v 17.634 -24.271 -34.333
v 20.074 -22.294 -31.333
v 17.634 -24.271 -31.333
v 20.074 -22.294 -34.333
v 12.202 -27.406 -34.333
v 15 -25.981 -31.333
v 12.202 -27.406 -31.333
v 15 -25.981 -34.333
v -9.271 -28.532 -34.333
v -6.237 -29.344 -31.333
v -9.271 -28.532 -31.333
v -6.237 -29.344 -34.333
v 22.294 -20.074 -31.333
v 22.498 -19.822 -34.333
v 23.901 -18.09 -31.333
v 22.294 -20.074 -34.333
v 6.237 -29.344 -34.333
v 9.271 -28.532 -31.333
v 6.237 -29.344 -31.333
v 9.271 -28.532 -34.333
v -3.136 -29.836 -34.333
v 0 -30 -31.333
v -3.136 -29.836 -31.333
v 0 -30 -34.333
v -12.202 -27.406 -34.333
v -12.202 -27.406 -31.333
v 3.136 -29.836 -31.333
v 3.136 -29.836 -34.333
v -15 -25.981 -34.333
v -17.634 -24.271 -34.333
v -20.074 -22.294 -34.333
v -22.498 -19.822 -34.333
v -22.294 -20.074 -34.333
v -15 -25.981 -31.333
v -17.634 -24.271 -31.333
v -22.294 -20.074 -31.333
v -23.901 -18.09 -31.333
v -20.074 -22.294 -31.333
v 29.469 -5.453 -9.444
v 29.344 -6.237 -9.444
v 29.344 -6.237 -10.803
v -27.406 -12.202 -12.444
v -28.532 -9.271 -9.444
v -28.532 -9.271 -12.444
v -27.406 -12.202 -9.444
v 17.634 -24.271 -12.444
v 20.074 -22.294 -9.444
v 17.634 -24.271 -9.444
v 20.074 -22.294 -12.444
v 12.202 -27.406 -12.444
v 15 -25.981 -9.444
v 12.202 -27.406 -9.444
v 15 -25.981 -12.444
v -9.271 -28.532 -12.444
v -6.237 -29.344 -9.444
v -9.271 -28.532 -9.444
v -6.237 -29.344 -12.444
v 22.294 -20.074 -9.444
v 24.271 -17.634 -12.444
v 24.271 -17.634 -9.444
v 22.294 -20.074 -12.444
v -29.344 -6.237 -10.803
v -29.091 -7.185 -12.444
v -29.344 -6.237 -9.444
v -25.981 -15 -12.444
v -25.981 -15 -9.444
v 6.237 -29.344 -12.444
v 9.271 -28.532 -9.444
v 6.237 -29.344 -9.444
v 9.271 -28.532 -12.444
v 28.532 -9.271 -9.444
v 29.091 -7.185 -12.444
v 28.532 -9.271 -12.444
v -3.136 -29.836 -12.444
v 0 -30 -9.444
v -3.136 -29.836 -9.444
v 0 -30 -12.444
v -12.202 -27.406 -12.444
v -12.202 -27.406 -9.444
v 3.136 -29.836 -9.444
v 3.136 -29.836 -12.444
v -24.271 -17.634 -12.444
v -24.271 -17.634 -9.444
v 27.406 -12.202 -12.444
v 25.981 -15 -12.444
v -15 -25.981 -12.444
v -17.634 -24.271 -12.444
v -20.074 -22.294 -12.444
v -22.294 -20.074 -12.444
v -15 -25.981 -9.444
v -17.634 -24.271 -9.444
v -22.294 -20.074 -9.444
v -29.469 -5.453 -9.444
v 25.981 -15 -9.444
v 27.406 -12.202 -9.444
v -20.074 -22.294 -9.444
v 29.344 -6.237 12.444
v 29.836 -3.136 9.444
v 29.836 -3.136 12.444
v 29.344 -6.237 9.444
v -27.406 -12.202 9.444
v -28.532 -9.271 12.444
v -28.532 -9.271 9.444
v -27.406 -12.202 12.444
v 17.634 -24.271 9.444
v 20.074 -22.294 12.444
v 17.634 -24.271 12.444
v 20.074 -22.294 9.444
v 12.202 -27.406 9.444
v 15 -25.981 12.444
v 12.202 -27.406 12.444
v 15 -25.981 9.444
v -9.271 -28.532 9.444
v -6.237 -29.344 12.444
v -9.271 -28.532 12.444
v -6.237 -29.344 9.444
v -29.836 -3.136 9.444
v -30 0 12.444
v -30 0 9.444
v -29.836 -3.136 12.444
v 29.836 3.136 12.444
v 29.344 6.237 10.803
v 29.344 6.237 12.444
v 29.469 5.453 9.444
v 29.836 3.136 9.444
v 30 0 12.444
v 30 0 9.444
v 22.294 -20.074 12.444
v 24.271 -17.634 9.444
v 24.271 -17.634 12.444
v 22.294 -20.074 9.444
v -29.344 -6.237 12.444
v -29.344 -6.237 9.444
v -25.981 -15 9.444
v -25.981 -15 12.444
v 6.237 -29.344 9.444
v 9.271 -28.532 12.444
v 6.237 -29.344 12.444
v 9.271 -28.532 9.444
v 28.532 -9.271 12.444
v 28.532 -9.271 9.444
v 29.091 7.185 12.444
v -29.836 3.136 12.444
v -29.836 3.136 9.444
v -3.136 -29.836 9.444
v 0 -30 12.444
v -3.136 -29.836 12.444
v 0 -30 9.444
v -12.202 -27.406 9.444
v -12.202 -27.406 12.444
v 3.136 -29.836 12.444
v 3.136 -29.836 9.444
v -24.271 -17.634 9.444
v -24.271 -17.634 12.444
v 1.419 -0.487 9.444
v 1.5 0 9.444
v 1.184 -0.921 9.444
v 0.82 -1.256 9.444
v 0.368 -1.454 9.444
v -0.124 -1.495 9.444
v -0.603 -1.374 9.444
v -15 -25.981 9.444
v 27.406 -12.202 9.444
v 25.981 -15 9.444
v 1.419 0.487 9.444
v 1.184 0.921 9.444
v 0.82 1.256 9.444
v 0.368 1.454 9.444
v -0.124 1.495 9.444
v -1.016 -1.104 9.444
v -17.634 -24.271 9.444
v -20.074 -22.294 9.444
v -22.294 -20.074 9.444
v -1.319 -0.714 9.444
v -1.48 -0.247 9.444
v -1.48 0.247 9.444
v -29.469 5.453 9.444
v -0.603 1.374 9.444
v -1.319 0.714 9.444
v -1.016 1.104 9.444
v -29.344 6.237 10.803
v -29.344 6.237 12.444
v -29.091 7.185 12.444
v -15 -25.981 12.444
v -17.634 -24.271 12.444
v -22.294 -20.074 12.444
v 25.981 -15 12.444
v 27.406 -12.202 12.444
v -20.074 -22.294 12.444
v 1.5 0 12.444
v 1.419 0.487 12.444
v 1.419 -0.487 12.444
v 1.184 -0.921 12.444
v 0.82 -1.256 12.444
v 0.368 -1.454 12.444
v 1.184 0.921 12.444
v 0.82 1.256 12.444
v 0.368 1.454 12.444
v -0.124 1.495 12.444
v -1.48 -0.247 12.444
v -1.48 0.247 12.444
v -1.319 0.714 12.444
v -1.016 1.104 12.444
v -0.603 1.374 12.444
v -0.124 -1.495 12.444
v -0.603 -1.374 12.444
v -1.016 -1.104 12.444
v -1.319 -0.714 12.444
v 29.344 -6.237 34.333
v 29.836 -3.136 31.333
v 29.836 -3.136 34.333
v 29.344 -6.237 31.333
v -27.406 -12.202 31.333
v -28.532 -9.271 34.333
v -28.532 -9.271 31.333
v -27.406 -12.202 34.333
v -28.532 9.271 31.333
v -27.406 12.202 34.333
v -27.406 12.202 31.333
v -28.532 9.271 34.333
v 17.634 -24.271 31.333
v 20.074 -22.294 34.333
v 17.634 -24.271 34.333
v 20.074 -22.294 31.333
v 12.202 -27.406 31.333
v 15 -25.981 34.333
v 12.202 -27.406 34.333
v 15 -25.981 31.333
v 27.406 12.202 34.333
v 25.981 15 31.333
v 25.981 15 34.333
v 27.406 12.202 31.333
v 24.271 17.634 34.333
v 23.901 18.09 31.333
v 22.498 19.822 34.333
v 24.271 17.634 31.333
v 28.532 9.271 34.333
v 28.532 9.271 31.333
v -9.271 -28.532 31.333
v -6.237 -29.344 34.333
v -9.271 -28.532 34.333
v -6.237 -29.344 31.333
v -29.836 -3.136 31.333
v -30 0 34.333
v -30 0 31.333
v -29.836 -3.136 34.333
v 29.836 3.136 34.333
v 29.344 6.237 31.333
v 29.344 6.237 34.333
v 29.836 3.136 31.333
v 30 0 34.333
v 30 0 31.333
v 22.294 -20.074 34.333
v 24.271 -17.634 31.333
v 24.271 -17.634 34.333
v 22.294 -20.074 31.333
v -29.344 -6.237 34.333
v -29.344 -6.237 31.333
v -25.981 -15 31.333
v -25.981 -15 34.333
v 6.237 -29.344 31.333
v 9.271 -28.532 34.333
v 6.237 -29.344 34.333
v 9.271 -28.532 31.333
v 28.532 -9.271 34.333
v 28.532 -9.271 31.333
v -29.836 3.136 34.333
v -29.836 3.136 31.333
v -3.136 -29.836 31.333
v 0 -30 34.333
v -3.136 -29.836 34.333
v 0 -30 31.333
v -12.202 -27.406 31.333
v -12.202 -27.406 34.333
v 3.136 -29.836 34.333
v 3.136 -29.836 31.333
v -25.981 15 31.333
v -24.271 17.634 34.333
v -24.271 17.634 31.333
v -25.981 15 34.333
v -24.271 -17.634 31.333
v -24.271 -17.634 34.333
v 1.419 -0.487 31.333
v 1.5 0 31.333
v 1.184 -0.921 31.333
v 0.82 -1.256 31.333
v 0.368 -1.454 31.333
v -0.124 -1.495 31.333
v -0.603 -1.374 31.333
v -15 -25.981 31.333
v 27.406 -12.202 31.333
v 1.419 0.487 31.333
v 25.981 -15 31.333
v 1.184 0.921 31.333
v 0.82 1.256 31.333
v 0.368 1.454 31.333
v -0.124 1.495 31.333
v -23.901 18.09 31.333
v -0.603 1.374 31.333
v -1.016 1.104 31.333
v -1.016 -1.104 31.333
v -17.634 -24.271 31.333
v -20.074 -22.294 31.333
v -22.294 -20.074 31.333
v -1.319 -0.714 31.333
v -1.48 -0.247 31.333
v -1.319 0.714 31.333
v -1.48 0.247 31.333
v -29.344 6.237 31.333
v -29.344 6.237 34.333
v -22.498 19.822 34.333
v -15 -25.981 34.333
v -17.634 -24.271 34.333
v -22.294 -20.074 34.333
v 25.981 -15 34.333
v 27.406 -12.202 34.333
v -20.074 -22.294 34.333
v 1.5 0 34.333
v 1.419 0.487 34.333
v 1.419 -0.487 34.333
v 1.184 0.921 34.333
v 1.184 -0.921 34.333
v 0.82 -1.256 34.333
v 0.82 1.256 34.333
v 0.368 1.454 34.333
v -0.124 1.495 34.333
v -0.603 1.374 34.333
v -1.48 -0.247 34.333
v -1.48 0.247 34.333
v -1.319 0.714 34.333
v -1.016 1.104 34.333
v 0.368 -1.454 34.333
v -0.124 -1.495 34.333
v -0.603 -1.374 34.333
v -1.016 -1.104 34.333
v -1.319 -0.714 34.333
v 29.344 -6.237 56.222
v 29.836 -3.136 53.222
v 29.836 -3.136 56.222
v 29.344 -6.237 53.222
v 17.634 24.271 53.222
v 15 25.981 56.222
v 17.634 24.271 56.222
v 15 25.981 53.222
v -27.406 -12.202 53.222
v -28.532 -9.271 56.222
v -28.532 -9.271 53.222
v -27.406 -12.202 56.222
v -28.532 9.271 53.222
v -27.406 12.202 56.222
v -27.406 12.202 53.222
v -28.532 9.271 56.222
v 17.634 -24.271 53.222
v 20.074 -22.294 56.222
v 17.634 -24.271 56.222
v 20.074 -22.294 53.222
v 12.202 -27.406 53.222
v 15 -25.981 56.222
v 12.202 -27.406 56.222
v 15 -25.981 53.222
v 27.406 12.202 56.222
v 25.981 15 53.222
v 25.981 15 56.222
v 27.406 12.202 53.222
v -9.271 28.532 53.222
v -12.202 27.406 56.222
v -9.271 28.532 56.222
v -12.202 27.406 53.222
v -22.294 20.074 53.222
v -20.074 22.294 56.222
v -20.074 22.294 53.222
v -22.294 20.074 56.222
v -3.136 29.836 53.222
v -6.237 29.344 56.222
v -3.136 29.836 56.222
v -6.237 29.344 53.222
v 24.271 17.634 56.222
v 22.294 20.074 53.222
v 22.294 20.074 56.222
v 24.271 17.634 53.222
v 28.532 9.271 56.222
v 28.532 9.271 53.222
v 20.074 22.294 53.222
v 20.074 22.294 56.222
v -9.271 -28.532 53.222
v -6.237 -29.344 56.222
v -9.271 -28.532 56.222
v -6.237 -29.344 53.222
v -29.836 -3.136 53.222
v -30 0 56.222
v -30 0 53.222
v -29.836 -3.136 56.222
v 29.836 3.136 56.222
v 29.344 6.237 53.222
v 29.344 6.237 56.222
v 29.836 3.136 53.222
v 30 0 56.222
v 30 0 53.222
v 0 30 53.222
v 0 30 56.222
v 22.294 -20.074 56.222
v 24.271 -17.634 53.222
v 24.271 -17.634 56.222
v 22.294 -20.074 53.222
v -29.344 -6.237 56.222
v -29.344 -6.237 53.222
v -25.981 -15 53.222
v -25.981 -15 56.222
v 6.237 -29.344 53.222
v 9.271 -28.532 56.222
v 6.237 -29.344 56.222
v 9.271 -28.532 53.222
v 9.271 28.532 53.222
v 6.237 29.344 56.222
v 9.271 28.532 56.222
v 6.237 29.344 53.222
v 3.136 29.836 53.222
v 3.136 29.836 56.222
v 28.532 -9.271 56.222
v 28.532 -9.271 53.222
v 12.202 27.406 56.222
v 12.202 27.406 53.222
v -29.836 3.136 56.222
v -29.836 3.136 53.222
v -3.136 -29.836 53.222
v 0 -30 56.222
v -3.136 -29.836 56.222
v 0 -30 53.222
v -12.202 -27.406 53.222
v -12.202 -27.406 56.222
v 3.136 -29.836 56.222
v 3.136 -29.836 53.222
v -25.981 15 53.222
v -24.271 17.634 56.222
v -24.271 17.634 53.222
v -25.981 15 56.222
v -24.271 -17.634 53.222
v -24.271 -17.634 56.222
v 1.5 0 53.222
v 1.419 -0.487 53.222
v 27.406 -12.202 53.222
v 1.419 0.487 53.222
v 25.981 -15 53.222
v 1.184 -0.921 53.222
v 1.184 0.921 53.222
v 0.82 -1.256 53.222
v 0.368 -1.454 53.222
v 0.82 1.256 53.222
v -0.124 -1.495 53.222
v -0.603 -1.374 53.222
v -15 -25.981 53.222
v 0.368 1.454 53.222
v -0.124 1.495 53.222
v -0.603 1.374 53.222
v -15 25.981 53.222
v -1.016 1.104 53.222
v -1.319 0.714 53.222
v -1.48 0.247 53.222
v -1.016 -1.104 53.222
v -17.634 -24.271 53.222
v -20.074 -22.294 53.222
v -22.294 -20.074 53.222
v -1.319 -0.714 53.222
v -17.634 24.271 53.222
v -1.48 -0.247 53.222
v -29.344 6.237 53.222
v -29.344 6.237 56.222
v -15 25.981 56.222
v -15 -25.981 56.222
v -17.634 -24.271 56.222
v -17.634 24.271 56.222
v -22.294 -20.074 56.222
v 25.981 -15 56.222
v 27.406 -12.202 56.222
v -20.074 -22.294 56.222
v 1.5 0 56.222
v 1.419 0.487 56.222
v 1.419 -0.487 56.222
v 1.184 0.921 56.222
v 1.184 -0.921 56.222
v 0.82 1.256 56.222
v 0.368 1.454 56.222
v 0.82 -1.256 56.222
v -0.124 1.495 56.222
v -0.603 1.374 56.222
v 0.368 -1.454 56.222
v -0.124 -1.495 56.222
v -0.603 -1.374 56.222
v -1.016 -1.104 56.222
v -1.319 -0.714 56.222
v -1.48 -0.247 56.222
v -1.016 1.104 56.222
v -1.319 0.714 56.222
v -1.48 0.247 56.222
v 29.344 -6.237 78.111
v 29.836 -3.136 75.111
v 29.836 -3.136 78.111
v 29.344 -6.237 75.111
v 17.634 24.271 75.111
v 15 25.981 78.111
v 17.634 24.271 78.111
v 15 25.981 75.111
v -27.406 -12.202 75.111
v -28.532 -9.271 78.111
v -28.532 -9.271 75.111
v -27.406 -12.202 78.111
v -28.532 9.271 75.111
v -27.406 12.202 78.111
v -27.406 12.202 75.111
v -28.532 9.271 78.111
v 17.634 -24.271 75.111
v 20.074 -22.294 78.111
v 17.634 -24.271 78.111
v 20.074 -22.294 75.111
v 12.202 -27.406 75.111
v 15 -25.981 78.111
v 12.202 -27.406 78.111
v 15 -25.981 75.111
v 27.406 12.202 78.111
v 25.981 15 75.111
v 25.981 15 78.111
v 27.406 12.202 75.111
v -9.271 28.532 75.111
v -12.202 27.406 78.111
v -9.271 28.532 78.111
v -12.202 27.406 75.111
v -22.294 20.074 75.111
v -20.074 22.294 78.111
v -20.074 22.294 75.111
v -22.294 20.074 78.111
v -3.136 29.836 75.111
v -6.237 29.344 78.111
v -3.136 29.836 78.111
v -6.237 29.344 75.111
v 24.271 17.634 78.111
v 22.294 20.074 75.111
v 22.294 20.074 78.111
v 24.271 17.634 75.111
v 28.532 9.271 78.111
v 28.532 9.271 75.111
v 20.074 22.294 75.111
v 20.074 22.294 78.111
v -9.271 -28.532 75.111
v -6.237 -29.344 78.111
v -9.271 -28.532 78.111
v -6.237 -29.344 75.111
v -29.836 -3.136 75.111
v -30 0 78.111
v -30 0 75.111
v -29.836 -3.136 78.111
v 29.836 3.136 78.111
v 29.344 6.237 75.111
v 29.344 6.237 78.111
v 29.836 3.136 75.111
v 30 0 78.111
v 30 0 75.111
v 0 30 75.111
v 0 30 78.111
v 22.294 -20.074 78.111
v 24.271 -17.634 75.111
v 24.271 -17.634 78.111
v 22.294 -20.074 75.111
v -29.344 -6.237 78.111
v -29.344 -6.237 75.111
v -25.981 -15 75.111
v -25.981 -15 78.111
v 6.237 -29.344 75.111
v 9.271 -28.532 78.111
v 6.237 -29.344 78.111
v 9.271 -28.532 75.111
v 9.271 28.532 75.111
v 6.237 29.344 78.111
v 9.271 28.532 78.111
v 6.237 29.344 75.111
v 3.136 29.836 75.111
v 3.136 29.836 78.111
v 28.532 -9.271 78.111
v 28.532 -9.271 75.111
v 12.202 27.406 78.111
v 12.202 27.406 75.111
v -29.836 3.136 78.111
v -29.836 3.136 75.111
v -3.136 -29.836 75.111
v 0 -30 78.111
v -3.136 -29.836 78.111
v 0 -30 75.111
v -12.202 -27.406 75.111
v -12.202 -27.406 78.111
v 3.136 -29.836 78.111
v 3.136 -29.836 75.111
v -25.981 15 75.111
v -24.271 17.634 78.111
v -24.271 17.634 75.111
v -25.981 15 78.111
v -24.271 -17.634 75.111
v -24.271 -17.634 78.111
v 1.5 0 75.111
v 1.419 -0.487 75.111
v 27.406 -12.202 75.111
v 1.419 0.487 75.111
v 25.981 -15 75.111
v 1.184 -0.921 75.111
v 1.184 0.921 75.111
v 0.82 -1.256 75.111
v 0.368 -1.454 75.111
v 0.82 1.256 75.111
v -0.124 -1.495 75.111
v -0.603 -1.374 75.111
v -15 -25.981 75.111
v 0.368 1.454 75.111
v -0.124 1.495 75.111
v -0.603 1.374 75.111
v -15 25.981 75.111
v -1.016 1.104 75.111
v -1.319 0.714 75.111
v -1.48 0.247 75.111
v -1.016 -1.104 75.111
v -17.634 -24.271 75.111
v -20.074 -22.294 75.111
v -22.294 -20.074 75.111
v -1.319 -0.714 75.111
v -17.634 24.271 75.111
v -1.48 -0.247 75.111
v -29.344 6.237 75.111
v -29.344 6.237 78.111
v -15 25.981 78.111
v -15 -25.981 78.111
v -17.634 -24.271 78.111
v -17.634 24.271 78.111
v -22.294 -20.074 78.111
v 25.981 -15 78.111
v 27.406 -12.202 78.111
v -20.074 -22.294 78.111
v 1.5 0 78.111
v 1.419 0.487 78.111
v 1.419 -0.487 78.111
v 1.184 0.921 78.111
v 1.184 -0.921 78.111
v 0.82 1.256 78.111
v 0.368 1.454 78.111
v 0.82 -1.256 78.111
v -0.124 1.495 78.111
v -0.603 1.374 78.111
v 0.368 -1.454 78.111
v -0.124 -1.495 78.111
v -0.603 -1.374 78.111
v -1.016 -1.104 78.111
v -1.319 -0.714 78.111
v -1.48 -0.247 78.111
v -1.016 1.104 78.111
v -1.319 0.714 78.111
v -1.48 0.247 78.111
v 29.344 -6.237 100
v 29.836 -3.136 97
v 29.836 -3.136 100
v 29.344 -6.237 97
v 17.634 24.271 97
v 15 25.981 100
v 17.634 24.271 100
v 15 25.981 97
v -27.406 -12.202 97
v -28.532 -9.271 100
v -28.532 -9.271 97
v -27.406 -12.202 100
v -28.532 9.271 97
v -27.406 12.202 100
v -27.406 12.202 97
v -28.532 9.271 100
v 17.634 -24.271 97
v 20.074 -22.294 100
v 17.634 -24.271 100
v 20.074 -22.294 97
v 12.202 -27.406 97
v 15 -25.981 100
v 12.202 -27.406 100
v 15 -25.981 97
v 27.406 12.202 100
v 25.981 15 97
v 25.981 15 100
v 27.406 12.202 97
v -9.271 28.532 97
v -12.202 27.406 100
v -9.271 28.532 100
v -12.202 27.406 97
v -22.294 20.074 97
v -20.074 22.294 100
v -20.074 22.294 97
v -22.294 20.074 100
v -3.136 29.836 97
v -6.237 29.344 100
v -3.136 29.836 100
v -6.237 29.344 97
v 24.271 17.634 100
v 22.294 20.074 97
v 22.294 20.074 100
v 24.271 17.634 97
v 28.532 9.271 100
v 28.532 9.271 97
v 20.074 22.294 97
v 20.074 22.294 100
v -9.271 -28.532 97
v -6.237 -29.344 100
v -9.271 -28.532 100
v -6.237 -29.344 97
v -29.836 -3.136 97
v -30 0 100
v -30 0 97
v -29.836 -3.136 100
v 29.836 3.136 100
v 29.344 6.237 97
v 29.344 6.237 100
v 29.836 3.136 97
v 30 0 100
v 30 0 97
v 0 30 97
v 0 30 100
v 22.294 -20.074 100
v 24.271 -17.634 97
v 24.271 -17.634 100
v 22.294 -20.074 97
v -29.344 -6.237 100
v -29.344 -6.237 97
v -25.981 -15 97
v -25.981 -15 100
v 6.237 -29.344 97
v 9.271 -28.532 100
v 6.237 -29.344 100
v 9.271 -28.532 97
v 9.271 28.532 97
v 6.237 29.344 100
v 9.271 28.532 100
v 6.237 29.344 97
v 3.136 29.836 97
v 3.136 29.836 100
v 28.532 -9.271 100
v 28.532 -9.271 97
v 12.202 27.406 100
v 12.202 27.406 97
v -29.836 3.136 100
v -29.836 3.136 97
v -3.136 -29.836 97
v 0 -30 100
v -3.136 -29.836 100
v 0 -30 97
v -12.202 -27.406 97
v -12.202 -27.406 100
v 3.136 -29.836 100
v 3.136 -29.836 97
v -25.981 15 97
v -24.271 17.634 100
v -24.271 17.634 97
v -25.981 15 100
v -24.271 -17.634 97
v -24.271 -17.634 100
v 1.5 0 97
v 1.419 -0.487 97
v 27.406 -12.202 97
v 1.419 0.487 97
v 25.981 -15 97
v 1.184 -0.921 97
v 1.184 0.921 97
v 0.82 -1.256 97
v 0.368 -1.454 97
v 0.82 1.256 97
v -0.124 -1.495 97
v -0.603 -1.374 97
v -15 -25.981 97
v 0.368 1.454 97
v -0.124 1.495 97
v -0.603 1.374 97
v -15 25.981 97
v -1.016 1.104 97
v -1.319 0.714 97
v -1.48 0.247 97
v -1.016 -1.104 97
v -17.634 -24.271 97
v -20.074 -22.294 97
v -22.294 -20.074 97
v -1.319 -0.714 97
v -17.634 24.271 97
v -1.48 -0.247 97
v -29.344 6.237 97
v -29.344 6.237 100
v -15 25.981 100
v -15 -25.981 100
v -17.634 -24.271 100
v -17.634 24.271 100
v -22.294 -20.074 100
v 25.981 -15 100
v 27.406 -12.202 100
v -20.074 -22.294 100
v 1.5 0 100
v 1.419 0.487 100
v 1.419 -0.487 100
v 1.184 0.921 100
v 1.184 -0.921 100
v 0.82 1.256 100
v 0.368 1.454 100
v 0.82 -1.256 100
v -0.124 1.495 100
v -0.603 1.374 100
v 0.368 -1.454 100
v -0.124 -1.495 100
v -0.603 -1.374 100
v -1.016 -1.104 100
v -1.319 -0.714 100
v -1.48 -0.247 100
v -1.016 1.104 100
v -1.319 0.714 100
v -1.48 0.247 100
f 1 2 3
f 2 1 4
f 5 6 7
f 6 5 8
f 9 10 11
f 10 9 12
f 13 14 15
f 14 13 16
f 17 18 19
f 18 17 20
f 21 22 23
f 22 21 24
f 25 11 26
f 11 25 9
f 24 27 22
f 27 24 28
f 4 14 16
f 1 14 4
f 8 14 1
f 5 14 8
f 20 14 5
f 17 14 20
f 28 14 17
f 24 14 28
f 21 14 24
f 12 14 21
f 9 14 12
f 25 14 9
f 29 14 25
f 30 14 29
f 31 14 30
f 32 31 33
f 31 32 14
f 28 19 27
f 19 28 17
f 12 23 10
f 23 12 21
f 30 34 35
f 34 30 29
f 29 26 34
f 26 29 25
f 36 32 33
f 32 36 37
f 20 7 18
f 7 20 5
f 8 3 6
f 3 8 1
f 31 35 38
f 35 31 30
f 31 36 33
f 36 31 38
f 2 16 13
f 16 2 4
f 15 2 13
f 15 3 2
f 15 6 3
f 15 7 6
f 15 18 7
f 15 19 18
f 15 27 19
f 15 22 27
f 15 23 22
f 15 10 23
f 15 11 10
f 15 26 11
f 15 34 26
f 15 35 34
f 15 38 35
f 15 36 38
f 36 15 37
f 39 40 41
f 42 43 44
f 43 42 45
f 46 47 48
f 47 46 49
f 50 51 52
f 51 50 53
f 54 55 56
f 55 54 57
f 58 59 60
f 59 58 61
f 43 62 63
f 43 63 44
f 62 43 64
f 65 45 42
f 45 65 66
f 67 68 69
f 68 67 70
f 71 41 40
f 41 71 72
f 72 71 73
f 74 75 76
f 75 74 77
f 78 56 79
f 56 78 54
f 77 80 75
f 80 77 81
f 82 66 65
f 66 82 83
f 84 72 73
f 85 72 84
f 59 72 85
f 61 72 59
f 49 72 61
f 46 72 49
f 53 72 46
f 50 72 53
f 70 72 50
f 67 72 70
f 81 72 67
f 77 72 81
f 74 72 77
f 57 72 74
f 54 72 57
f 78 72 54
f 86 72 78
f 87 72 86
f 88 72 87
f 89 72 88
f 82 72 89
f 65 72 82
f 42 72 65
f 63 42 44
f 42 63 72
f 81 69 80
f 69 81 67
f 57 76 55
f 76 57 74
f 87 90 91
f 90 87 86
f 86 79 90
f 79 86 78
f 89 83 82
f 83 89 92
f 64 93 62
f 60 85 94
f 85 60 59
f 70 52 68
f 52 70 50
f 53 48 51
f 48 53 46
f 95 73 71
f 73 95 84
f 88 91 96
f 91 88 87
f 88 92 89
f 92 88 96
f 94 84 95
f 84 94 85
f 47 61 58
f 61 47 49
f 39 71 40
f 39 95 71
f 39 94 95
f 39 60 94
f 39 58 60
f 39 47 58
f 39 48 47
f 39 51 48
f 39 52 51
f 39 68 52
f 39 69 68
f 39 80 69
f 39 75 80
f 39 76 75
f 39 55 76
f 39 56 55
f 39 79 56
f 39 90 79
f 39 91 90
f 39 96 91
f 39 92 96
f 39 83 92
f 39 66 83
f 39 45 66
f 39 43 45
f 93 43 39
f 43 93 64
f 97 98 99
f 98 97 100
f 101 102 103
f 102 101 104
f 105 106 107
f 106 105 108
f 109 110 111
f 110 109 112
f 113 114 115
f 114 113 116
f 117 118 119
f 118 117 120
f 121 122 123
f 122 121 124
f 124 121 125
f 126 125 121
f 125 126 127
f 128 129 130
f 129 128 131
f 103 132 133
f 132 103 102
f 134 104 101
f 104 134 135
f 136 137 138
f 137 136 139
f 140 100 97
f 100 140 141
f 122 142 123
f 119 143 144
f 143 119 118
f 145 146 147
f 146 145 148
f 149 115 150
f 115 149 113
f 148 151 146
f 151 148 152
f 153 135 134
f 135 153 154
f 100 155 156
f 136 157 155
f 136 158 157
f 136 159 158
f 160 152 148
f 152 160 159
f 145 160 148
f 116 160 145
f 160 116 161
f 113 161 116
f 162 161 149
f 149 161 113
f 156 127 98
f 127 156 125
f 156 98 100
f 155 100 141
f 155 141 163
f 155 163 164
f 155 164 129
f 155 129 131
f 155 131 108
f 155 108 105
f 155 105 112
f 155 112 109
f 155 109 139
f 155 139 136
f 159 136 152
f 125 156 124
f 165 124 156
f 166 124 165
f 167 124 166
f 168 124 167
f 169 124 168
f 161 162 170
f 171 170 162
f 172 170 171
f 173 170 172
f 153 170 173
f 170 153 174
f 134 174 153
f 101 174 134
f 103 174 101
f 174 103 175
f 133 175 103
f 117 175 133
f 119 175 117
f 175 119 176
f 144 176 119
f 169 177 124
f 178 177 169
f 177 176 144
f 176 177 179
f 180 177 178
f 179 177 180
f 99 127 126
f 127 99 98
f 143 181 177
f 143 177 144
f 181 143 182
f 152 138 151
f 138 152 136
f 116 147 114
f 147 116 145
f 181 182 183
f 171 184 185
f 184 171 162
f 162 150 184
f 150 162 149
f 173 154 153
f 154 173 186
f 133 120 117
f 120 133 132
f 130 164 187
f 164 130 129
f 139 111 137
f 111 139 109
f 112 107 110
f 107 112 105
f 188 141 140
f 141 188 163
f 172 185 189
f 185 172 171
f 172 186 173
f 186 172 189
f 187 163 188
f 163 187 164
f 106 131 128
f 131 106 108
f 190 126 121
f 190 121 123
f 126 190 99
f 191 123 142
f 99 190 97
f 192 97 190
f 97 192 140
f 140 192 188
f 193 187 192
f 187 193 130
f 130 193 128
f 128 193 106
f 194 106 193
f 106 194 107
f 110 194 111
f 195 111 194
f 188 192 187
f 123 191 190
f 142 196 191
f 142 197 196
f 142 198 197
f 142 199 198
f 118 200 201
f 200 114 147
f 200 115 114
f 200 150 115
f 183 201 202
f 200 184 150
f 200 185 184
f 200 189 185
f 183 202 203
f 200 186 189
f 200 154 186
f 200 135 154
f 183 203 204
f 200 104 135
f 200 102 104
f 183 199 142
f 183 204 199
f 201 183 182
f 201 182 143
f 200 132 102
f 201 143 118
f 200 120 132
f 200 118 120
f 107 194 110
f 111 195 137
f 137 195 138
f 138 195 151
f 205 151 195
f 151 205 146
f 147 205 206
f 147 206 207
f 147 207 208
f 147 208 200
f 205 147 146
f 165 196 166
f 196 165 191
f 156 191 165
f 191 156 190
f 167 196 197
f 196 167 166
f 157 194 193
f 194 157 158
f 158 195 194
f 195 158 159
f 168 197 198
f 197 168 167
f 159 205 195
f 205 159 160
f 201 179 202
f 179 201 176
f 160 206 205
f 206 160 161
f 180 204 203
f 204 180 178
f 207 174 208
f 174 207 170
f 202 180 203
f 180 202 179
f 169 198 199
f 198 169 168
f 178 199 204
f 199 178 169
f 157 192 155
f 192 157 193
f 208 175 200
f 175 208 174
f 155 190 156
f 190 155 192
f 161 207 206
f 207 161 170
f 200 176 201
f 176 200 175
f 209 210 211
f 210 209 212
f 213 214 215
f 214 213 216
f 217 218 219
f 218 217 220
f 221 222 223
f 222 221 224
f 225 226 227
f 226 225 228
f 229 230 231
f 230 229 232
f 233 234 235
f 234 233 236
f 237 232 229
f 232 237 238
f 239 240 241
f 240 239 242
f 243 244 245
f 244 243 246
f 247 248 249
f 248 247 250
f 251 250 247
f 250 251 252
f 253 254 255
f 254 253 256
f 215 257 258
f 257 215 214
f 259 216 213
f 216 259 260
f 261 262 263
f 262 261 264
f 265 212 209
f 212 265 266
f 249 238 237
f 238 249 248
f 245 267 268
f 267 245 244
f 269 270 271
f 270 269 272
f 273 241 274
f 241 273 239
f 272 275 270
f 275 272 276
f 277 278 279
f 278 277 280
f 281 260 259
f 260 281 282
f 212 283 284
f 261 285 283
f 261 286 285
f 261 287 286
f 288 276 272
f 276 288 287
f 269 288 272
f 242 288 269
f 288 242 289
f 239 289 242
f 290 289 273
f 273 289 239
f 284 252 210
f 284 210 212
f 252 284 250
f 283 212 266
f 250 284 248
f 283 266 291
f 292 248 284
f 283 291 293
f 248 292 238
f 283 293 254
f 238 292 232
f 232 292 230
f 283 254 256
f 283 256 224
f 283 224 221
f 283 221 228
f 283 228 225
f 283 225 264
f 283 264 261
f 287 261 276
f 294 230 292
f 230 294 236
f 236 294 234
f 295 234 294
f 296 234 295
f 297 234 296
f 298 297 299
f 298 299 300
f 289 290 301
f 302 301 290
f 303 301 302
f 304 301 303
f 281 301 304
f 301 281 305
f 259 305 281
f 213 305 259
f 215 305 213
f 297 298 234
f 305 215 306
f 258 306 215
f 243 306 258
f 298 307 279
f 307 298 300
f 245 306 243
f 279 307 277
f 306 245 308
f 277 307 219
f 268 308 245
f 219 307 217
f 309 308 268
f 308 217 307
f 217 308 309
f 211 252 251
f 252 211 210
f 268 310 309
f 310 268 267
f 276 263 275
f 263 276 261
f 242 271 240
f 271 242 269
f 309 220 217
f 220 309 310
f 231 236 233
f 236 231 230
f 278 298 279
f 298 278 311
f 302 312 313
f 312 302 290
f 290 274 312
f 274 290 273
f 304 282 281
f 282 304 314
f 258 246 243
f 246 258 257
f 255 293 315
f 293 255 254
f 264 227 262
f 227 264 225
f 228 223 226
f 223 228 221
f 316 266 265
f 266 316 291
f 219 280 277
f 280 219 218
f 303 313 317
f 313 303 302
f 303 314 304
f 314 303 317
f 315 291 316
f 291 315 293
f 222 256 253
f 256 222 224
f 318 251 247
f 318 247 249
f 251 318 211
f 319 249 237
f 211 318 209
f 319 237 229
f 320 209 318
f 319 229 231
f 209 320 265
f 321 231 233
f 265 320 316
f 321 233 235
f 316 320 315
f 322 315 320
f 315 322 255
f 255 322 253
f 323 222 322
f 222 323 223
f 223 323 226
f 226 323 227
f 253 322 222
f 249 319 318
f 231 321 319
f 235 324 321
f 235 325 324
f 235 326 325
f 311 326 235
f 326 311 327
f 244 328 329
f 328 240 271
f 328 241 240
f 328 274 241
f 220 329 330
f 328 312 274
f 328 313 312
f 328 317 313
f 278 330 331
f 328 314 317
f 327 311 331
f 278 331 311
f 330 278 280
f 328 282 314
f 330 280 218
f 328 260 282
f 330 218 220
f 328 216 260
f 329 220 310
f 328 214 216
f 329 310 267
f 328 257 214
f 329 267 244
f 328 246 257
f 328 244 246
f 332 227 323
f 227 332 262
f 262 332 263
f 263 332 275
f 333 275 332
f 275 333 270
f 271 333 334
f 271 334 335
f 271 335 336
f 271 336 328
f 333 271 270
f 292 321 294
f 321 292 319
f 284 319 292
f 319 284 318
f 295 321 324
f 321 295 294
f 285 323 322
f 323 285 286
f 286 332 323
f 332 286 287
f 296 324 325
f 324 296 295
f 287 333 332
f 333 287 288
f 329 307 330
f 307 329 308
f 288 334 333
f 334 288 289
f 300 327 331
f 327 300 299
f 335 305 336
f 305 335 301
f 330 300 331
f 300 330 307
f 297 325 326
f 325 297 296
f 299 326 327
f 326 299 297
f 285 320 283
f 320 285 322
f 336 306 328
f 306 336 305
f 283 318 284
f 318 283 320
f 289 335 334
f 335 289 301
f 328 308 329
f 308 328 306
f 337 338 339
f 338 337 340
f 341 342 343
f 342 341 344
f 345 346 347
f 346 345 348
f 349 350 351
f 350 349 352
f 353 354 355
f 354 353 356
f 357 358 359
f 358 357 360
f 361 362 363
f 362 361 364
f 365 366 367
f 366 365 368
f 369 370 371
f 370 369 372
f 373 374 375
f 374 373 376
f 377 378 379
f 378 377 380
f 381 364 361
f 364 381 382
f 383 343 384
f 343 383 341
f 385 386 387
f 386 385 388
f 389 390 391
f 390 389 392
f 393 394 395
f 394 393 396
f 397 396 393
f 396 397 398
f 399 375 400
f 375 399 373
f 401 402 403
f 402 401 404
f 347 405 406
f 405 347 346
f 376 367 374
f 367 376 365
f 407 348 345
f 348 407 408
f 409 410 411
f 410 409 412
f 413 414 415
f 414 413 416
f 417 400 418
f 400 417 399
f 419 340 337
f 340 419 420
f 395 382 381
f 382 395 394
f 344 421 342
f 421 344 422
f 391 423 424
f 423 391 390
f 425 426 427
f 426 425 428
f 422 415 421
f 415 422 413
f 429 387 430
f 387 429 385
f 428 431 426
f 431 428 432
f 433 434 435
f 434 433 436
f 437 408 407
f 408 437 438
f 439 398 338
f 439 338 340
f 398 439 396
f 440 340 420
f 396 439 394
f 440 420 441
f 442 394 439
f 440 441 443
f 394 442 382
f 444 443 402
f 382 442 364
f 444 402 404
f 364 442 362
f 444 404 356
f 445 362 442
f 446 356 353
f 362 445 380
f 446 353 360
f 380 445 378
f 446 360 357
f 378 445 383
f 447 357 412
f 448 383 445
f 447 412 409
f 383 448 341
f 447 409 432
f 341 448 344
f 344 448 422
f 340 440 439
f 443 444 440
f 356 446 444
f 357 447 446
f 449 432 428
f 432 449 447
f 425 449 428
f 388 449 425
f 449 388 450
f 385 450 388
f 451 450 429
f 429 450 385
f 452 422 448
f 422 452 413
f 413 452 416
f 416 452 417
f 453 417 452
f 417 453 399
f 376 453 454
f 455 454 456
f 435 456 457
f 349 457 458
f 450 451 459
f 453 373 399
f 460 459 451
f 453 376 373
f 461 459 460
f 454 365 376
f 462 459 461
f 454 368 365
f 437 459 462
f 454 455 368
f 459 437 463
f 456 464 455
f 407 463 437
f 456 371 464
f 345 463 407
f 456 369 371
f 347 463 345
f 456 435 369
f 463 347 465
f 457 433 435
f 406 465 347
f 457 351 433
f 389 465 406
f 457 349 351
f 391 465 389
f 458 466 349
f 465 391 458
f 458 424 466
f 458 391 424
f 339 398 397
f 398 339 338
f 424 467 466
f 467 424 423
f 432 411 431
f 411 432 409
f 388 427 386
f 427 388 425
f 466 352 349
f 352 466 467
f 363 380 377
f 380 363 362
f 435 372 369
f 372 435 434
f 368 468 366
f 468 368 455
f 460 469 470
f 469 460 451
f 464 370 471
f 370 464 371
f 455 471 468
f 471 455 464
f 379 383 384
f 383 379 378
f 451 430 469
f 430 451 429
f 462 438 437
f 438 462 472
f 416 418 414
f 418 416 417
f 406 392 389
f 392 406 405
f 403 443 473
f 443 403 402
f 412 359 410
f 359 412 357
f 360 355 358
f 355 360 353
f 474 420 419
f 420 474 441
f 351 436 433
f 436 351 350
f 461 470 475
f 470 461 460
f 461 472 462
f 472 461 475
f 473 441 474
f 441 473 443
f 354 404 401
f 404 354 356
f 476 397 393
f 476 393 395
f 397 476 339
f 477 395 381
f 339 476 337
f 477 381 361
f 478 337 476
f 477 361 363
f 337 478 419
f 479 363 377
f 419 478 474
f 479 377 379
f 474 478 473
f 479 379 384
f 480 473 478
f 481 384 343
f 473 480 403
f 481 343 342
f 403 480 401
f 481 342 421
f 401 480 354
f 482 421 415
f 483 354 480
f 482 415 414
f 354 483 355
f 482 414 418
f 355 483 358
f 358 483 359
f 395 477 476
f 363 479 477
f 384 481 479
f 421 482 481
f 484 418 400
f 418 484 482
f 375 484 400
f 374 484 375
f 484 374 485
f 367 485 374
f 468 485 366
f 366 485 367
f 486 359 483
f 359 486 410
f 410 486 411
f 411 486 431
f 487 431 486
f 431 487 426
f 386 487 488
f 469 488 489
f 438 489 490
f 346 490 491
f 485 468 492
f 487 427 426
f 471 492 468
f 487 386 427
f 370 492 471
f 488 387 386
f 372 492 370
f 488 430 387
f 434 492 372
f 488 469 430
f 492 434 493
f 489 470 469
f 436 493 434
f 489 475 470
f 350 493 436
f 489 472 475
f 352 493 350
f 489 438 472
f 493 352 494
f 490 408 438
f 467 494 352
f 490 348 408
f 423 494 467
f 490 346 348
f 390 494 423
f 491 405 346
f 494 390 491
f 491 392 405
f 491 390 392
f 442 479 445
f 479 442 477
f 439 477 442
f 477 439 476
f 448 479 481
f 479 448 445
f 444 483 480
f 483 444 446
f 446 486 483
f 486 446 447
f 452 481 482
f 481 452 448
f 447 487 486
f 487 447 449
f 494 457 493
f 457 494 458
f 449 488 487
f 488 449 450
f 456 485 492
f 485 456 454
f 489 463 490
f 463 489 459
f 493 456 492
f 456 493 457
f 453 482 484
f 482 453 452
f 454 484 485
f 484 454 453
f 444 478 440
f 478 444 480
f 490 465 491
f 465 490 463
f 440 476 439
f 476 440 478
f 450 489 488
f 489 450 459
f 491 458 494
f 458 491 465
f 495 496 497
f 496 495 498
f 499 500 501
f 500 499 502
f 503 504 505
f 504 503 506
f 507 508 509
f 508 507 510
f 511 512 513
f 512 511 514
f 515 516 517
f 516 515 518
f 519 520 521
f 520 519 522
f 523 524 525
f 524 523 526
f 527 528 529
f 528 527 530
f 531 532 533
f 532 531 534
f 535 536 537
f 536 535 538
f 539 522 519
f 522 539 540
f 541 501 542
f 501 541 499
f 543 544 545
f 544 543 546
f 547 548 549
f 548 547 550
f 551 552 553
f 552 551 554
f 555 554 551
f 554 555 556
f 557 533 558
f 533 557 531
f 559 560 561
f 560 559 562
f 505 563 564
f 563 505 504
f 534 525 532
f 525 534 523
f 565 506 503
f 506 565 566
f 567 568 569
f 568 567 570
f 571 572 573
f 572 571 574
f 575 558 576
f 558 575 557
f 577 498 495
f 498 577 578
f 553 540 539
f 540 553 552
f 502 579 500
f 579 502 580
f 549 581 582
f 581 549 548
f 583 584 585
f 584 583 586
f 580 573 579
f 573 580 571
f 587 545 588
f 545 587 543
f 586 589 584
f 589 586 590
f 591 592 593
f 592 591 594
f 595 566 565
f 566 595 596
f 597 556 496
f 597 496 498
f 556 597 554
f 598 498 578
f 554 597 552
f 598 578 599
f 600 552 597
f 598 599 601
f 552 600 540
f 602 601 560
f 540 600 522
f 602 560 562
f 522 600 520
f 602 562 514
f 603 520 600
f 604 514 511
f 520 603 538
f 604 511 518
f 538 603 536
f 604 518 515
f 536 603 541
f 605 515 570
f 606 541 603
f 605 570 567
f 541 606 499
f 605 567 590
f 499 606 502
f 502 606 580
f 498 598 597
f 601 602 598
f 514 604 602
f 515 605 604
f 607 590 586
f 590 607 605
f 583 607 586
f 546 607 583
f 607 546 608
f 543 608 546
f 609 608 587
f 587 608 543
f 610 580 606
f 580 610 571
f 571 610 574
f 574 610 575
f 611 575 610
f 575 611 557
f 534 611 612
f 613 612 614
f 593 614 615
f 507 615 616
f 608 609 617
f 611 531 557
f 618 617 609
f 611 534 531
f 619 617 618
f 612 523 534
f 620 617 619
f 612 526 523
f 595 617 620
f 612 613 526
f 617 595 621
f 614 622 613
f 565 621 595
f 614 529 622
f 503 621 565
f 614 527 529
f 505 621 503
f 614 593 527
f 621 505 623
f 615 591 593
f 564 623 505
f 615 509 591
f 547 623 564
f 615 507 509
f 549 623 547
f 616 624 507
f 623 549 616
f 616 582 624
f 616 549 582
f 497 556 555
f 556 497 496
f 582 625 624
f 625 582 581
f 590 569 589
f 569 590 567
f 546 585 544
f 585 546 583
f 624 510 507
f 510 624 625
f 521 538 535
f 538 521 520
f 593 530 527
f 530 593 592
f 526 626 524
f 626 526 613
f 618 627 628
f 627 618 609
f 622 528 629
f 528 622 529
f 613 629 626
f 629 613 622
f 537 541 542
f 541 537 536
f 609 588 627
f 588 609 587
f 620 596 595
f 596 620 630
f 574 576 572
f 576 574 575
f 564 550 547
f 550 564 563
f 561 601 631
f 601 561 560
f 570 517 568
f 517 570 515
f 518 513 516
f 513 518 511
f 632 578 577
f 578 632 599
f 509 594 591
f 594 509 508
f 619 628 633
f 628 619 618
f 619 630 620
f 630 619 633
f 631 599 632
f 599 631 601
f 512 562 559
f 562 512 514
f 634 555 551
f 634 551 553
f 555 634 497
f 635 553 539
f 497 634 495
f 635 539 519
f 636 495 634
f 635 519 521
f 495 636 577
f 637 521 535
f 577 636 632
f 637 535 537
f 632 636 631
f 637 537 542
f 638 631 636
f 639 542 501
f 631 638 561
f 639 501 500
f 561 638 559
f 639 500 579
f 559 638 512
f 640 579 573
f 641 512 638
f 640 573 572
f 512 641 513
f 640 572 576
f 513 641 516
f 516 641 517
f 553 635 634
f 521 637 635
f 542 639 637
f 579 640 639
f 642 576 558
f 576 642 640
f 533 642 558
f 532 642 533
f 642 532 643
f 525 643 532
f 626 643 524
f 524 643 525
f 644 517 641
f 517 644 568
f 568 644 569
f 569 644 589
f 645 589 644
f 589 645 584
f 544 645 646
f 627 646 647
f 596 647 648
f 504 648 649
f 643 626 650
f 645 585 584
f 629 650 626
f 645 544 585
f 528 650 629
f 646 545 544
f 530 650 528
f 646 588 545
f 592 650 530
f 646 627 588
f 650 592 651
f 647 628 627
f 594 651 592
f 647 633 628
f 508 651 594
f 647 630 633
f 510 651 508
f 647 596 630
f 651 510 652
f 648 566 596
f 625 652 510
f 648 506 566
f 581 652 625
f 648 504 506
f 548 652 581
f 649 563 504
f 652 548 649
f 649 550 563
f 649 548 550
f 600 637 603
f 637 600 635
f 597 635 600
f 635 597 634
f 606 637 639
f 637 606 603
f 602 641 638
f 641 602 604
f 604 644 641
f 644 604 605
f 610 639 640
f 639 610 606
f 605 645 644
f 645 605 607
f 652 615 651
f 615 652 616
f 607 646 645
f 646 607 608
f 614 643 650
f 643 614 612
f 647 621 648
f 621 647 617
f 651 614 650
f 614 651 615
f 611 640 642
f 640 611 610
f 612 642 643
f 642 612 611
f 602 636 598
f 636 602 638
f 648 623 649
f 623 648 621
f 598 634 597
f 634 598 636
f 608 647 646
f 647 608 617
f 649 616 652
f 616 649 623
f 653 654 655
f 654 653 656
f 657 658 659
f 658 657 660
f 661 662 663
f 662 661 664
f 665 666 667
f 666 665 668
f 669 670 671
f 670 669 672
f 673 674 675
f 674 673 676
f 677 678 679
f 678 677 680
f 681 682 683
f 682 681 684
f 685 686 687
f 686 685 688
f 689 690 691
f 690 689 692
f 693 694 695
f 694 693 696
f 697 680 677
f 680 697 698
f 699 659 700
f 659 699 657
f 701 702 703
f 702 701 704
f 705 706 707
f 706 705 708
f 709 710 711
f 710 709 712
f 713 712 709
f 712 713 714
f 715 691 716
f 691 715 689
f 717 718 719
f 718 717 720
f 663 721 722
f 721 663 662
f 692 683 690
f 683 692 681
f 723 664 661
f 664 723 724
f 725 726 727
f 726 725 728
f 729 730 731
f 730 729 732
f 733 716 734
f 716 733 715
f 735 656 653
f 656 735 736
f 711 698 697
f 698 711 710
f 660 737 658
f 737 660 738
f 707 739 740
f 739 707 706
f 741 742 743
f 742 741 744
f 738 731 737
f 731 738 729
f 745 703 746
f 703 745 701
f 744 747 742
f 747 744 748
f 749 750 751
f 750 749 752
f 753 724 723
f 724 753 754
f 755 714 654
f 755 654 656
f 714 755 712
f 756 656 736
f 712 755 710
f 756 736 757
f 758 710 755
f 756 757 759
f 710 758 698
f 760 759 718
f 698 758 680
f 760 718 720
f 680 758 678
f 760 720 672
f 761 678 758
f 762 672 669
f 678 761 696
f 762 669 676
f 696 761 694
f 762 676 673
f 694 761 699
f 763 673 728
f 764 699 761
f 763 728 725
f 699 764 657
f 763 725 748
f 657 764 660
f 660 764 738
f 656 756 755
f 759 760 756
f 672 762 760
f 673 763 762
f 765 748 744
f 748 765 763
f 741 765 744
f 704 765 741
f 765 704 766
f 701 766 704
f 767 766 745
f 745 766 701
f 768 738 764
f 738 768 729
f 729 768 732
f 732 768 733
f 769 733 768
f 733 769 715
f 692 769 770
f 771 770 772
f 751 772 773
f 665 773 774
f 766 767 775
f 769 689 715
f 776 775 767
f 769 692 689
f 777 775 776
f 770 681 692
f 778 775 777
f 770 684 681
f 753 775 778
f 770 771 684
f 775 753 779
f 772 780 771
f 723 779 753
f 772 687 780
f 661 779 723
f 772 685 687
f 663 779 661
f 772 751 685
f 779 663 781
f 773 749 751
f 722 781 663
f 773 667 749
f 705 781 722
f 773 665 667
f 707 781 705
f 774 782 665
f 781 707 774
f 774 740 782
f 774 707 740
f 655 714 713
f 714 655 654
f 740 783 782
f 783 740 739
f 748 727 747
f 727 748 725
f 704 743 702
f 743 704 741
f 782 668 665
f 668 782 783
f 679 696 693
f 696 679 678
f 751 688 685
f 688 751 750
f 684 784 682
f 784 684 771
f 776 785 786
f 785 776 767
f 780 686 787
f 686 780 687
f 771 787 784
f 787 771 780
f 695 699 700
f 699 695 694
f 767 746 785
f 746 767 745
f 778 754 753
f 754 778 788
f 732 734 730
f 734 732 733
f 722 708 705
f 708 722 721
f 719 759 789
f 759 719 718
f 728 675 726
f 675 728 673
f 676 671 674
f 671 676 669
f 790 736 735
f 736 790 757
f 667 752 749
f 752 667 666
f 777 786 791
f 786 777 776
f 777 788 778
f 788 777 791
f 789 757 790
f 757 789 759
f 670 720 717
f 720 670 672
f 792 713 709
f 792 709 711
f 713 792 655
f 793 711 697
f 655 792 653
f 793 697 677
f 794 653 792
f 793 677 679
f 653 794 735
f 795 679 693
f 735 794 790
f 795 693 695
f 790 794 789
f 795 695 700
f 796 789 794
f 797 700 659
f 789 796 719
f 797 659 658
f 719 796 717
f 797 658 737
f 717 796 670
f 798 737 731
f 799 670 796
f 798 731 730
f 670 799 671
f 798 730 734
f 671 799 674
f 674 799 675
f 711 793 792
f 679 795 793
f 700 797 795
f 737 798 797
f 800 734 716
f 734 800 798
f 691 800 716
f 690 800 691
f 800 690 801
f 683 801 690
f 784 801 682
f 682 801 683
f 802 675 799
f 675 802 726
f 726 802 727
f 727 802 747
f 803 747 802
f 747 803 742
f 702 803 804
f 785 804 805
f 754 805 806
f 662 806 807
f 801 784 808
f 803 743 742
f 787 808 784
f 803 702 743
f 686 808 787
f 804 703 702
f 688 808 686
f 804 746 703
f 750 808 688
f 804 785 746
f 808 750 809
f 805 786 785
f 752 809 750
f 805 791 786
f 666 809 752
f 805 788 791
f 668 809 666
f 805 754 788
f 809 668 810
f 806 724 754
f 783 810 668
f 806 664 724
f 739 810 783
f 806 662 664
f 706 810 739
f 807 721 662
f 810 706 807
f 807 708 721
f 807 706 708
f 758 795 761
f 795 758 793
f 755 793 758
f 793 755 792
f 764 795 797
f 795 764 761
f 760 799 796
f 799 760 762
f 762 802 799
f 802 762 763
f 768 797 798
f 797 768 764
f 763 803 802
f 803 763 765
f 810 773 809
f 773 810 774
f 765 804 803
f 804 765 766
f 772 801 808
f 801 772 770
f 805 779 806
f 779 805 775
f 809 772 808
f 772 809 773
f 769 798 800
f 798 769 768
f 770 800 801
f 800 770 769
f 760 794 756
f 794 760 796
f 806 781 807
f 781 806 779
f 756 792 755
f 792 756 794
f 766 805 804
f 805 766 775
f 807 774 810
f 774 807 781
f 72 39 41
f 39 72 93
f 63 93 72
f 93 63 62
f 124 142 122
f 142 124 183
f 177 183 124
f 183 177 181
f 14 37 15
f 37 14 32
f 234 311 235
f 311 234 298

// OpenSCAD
rotate(a=[-30, 0, 0])
  difference(){
    rotate(a=[30, 0, 0])
      union(){
        %
        // tube
        difference(){
          translate(v=[0, 0, -100])
            cylinder(h=200, d1=60, d2=60, $fa=6, $fs=0.5);
          translate(v=[0, 0, -100.05])
            cylinder(h=200.1, d1=58.5, d2=58.5, $fa=6, $fs=0.5);
        }
        // rings
        translate(v=[0, 0, -98.5])
          union(){
            translate(v=[0, 0, 0])
              // ring
              // ring
              difference(){
                // outer
                translate(v=[0, 0, -1.5])
                  cylinder(h=3, d1=60, d2=60, $fa=6, $fs=0.5);
                // inner
                translate(v=[0, 0, -1.6])
                  cylinder(h=3.2, d1=3, d2=3, $fa=6, $fs=0.5);
              }
            translate(v=[0, 0, 21.88888888888889])
              // ring
              // ring
              difference(){
                // outer
                translate(v=[0, 0, -1.5])
                  cylinder(h=3, d1=60, d2=60, $fa=6, $fs=0.5);
                // inner
                translate(v=[0, 0, -1.6])
                  cylinder(h=3.2, d1=3, d2=3, $fa=6, $fs=0.5);
              }
            translate(v=[0, 0, 43.77777777777778])
              // ring
              // ring
              difference(){
                // outer
                translate(v=[0, 0, -1.5])
                  cylinder(h=3, d1=60, d2=60, $fa=6, $fs=0.5);
                // inner
                translate(v=[0, 0, -1.6])
                  cylinder(h=3.2, d1=3, d2=3, $fa=6, $fs=0.5);
              }
            translate(v=[0, 0, 65.66666666666667])
              // ring
              // ring
              difference(){
                // outer
                translate(v=[0, 0, -1.5])
                  cylinder(h=3, d1=60, d2=60, $fa=6, $fs=0.5);
                // inner
                translate(v=[0, 0, -1.6])
                  cylinder(h=3.2, d1=3, d2=3, $fa=6, $fs=0.5);
              }
            translate(v=[0, 0, 87.55555555555556])
              // ring
              // ring
              difference(){
                // outer
                translate(v=[0, 0, -1.5])
                  cylinder(h=3, d1=60, d2=60, $fa=6, $fs=0.5);
                // inner
                translate(v=[0, 0, -1.6])
                  cylinder(h=3.2, d1=3, d2=3, $fa=6, $fs=0.5);
              }
            translate(v=[0, 0, 109.44444444444444])
              // ring
              // ring
              difference(){
                // outer
                translate(v=[0, 0, -1.5])
                  cylinder(h=3, d1=60, d2=60, $fa=6, $fs=0.5);
                // inner
                translate(v=[0, 0, -1.6])
                  cylinder(h=3.2, d1=3, d2=3, $fa=6, $fs=0.5);
              }
            translate(v=[0, 0, 131.33333333333334])
              // ring
              // ring
              difference(){
                // outer
                translate(v=[0, 0, -1.5])
                  cylinder(h=3, d1=60, d2=60, $fa=6, $fs=0.5);
                // inner
                translate(v=[0, 0, -1.6])
                  cylinder(h=3.2, d1=3, d2=3, $fa=6, $fs=0.5);
              }
            translate(v=[0, 0, 153.22222222222223])
              // ring
              // ring
              difference(){
                // outer
                translate(v=[0, 0, -1.5])
                  cylinder(h=3, d1=60, d2=60, $fa=6, $fs=0.5);
                // inner
                translate(v=[0, 0, -1.6])
                  cylinder(h=3.2, d1=3, d2=3, $fa=6, $fs=0.5);
              }
            translate(v=[0, 0, 175.11111111111111])
              // ring
              // ring
              difference(){
                // outer
                translate(v=[0, 0, -1.5])
                  cylinder(h=3, d1=60, d2=60, $fa=6, $fs=0.5);
                // inner
                translate(v=[0, 0, -1.6])
                  cylinder(h=3.2, d1=3, d2=3, $fa=6, $fs=0.5);
              }
            translate(v=[0, 0, 197])
              // ring
              // ring
              difference(){
                // outer
                translate(v=[0, 0, -1.5])
                  cylinder(h=3, d1=60, d2=60, $fa=6, $fs=0.5);
                // inner
                translate(v=[0, 0, -1.6])
                  cylinder(h=3.2, d1=3, d2=3, $fa=6, $fs=0.5);
              }
          }
      }
    translate(v=[0, 500, 0])
      translate(v=[-500, -500, -500])
        cube(size=[1000, 1000, 1000]);
  }
